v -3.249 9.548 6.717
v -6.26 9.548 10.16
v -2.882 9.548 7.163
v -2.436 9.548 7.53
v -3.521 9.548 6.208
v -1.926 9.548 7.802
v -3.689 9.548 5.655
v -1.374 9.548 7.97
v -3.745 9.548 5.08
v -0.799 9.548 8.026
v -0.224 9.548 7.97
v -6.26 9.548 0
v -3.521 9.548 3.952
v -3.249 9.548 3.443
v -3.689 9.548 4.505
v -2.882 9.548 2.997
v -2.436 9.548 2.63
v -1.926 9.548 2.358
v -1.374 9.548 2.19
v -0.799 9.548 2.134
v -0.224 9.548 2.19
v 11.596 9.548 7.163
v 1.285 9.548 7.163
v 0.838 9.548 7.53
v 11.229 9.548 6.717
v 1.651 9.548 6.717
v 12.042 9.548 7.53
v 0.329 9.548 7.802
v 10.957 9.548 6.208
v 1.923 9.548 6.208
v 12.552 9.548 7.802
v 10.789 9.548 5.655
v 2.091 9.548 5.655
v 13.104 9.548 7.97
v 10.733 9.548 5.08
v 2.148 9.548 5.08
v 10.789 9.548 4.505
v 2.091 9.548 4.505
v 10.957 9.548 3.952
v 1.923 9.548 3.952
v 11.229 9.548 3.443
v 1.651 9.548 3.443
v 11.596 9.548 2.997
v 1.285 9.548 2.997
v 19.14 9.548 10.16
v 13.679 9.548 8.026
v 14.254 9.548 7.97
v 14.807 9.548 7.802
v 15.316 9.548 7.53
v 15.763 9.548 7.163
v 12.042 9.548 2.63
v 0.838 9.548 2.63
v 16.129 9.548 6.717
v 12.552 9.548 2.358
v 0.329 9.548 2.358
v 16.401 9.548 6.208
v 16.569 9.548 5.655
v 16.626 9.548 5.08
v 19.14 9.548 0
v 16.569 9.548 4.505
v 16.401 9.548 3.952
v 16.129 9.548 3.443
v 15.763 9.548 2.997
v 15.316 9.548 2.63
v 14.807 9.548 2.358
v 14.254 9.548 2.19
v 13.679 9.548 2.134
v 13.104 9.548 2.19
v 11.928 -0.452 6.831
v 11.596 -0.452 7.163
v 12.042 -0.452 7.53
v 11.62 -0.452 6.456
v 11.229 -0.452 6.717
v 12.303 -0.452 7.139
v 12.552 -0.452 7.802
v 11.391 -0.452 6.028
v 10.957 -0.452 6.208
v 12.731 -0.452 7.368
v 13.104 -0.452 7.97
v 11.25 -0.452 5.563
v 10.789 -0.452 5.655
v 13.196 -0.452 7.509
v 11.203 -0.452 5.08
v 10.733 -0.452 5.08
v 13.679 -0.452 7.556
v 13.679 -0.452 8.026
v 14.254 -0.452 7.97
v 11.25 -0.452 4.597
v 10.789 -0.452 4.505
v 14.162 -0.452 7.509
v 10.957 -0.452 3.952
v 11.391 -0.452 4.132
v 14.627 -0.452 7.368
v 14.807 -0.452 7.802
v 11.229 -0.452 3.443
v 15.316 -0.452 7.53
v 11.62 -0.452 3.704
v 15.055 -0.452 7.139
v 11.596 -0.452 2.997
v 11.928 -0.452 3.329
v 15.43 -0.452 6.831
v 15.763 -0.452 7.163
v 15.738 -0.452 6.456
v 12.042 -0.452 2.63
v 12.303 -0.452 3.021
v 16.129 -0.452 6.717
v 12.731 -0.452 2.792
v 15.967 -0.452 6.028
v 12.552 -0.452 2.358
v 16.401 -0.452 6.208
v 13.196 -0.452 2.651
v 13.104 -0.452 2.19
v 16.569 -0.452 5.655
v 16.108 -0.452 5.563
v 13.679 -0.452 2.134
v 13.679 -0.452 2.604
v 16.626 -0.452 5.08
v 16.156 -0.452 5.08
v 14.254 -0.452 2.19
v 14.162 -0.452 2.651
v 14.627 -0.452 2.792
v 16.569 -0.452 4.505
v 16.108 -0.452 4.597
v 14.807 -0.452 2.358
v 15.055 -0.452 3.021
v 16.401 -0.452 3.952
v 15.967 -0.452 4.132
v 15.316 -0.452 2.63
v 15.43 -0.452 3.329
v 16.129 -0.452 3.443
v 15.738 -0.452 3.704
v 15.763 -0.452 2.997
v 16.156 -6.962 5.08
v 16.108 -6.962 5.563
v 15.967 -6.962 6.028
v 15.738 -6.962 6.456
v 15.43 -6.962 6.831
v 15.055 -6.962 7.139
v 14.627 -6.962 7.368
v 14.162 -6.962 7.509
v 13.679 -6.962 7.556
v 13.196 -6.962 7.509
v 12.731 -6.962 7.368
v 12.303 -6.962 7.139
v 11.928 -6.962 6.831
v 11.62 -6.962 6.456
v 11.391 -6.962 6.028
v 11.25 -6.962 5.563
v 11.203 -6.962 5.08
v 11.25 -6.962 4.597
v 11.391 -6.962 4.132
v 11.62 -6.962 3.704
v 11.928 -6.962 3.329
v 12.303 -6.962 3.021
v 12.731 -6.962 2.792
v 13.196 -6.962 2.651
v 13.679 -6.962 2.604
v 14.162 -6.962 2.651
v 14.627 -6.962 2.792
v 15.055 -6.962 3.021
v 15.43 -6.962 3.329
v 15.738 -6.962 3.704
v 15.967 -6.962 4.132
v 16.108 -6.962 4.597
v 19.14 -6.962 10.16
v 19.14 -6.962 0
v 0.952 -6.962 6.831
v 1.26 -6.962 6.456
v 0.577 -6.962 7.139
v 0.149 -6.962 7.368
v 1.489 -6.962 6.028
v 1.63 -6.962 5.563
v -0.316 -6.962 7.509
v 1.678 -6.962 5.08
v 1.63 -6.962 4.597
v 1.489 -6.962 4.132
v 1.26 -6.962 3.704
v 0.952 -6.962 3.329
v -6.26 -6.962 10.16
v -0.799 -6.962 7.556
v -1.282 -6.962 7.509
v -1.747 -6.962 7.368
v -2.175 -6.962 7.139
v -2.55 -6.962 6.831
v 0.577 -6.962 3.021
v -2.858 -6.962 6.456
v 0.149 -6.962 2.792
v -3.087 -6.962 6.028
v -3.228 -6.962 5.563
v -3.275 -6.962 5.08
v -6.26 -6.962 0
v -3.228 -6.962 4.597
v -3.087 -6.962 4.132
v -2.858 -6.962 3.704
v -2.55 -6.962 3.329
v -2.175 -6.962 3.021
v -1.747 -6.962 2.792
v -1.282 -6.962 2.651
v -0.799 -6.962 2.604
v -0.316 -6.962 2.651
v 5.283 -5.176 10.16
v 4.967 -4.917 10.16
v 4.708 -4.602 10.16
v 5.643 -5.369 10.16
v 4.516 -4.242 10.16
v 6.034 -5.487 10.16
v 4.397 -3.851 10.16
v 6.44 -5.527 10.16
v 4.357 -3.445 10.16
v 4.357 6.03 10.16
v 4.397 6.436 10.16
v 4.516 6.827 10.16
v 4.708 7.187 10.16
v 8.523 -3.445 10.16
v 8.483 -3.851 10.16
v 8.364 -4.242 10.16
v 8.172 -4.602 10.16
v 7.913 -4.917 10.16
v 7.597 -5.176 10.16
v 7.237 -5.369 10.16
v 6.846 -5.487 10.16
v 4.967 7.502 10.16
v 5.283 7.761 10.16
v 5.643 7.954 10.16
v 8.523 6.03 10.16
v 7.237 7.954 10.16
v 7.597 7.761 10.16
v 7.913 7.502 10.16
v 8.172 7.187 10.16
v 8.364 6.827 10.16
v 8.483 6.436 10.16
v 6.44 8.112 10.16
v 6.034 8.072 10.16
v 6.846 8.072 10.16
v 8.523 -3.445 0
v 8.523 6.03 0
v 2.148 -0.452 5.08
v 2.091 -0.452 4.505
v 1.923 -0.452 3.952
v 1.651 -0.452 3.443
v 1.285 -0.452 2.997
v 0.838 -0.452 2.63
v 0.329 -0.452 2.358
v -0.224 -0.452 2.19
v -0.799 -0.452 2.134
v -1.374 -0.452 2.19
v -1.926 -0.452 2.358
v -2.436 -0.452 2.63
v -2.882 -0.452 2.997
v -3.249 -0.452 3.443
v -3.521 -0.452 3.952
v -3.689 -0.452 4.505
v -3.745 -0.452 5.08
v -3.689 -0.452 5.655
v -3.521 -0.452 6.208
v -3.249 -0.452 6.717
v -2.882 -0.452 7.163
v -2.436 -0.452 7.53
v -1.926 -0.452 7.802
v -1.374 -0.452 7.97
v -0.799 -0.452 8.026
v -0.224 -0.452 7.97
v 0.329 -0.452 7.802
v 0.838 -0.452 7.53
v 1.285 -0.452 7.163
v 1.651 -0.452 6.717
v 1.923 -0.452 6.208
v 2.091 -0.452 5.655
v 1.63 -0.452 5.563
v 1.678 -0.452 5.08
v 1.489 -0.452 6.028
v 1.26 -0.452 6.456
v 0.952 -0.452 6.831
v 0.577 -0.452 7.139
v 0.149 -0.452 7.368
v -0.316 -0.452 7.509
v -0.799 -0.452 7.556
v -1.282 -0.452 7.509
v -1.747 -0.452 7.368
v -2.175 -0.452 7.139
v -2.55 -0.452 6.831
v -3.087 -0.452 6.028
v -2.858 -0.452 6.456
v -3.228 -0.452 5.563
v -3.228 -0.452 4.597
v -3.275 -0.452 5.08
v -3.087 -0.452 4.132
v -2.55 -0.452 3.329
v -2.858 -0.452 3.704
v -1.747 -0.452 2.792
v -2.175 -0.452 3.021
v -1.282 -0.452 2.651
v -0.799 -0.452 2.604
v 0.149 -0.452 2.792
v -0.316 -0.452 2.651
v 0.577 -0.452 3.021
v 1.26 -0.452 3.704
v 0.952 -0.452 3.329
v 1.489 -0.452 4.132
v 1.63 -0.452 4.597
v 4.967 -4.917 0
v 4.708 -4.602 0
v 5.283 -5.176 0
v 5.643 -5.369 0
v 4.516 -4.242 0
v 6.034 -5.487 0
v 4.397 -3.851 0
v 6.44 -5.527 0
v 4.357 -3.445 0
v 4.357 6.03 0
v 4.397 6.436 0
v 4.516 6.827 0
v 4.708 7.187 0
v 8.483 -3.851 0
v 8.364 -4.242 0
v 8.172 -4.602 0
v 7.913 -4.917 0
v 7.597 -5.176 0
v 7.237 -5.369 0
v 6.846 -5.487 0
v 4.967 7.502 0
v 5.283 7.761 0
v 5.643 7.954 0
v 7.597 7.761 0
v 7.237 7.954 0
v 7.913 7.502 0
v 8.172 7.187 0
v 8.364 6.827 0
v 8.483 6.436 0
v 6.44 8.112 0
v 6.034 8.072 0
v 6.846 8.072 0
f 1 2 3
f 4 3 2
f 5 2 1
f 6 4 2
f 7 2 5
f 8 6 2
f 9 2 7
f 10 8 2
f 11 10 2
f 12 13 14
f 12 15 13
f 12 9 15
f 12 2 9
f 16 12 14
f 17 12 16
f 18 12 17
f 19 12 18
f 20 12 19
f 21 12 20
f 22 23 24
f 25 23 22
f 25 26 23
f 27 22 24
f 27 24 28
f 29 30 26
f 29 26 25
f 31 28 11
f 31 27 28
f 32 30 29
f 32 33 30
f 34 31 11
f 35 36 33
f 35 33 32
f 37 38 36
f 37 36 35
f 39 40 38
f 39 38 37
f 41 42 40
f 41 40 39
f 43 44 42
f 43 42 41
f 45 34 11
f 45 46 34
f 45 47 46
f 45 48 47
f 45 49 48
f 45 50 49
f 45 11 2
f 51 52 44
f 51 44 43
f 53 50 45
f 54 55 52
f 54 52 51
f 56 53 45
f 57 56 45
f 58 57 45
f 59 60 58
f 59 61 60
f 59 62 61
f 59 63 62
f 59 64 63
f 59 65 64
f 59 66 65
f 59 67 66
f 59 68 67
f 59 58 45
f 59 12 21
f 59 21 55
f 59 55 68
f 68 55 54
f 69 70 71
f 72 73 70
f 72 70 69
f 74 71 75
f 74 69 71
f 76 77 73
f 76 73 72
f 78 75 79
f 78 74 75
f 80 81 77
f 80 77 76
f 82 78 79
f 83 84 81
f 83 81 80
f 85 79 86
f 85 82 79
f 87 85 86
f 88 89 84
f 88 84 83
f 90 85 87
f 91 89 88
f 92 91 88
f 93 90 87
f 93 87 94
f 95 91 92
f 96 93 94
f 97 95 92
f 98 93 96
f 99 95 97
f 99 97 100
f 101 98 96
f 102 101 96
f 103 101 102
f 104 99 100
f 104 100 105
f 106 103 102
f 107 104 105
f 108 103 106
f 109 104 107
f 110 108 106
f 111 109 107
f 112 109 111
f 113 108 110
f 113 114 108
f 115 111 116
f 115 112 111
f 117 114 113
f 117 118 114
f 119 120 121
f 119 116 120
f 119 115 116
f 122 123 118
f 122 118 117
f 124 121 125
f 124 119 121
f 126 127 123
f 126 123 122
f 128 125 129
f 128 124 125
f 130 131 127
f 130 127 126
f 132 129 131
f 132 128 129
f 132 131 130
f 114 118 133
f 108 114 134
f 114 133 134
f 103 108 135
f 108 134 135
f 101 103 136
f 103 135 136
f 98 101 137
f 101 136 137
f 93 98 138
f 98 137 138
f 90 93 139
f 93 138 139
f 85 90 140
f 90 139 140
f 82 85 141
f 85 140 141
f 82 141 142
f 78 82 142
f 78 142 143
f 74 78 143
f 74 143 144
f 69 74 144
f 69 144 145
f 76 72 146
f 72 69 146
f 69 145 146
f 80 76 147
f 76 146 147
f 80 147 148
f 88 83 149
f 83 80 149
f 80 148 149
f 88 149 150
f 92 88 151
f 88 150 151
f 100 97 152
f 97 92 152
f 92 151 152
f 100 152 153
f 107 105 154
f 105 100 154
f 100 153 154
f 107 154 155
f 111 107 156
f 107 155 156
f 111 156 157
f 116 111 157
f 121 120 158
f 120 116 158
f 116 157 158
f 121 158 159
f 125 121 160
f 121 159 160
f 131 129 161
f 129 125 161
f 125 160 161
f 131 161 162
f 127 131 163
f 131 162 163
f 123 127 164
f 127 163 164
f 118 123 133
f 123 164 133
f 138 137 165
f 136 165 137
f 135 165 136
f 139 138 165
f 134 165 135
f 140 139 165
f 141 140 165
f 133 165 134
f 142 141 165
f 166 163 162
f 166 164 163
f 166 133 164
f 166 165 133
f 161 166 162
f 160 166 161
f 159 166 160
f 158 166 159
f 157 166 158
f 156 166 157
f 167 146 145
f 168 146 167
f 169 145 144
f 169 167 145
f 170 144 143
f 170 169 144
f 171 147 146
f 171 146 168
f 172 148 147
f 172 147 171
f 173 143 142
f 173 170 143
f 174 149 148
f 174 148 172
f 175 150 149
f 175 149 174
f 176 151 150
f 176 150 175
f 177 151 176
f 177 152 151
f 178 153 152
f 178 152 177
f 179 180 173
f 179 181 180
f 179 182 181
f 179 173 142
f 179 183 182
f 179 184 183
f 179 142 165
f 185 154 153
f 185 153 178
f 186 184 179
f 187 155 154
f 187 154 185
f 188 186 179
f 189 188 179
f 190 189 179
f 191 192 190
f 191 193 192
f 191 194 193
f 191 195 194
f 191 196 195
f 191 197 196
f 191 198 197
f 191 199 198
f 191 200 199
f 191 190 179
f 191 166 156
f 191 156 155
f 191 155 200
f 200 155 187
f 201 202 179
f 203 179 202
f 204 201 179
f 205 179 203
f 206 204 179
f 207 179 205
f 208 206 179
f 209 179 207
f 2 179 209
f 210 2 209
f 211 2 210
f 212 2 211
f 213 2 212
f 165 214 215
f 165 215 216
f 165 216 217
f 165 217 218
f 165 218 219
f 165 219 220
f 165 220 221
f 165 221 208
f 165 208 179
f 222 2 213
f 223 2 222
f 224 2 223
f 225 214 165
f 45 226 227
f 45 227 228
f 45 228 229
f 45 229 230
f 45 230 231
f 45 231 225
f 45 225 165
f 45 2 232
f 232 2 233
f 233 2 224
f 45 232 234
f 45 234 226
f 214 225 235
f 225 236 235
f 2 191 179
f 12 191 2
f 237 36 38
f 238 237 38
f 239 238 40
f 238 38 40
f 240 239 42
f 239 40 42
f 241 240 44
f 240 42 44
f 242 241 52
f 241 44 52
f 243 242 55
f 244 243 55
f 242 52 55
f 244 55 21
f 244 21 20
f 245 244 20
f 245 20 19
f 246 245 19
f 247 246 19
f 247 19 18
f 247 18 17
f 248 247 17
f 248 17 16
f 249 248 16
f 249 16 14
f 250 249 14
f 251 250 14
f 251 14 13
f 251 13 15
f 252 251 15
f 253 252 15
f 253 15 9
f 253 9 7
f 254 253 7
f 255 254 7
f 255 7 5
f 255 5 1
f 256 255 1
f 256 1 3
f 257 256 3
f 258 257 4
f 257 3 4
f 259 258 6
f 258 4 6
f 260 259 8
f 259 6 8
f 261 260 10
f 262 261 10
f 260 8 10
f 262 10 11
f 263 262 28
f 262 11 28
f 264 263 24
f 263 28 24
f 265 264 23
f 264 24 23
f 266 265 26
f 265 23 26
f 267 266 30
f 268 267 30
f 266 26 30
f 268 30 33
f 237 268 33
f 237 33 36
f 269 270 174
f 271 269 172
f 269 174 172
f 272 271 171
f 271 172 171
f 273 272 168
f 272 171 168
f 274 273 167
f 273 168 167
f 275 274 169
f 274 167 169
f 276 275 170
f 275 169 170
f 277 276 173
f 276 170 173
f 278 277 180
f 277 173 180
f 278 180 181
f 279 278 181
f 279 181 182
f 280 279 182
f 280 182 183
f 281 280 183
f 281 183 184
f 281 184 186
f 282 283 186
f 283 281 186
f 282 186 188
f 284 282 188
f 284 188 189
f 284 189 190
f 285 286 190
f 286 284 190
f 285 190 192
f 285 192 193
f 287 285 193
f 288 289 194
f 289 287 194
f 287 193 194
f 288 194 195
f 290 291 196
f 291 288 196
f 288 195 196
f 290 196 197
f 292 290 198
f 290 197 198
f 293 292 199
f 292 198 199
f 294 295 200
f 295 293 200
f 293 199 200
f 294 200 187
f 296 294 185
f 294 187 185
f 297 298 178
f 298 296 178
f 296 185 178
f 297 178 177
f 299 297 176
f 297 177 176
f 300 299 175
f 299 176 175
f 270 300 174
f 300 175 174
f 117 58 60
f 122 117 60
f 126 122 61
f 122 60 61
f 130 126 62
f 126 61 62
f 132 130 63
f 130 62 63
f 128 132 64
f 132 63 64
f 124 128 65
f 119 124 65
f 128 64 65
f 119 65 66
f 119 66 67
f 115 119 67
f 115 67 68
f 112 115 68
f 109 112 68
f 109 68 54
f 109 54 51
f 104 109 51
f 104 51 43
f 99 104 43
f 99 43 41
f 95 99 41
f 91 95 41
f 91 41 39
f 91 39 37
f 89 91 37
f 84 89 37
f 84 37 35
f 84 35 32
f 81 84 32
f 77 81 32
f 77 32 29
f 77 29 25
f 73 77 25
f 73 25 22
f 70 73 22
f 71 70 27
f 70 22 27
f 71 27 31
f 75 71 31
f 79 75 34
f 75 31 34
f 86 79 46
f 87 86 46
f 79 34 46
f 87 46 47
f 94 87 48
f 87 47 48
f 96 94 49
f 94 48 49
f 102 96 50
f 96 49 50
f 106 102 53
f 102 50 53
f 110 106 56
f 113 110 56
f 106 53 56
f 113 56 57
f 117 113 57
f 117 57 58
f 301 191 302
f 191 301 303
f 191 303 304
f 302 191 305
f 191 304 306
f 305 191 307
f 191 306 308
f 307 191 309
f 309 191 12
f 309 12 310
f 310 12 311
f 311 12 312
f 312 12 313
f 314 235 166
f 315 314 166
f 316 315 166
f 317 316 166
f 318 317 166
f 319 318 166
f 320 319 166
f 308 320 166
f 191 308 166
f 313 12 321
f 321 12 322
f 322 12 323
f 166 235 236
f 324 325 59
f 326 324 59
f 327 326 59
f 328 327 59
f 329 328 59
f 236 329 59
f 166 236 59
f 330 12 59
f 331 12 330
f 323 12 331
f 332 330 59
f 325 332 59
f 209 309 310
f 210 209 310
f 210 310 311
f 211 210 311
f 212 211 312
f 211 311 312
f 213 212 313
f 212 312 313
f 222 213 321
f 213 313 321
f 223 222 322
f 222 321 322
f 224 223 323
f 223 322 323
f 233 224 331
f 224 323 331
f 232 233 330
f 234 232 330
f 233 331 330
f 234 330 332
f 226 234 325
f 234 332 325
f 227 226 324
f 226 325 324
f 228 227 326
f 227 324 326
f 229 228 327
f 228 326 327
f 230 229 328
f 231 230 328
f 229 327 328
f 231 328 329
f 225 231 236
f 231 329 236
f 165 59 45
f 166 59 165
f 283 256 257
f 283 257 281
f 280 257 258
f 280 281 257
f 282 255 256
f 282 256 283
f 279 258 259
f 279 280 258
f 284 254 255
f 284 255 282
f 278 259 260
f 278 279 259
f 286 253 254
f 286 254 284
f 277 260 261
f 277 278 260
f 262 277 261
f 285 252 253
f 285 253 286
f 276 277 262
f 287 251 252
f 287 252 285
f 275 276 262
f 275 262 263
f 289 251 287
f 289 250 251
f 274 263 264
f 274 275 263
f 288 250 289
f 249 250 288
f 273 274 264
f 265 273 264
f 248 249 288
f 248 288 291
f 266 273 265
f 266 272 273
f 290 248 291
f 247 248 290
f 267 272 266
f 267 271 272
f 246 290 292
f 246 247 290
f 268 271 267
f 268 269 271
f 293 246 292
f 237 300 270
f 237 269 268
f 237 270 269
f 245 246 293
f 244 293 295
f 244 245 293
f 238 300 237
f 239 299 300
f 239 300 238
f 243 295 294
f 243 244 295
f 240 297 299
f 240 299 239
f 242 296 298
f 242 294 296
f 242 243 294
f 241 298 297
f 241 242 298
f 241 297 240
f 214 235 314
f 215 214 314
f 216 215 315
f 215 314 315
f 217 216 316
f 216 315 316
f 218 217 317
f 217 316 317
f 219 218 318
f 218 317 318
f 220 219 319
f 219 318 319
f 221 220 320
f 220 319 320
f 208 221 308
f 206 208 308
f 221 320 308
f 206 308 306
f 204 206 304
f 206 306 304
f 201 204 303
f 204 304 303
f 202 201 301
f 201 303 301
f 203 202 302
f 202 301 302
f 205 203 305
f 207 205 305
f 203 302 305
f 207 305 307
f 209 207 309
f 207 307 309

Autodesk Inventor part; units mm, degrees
ref_plane "YZ Plane" through (0, 0, 0) normal (1, 0, 0) x (0, 1, 0)
ref_plane "XZ Plane" through (0, 0, 0) normal (0, 1, 0) x (-1, 0, 0)
ref_plane "XY Plane" through (0, 0, 0) normal (0, 0, 1) x (1, 0, 0)
sketch "Sketch1" plane through (0, 0, 0) normal (0, 0, 1) x (1, 0, 0)
  line L0 (-6.2599, 9.5475) -> (19.1401, 9.5475)
  line L1 (19.1401, 9.5475) -> (19.1401, -6.9625)
  line L2 (19.1401, -6.9625) -> (-6.2599, -6.9625)
  line L3 (-6.2599, -6.9625) -> (-6.2599, 9.5475)
  point P0 (0, 0)
  dimension "d0" = 25.4
  dimension "d1" = 16.51
extrude "Plate1" add sketch "Sketch1" along normal blind 10.16
sketch "Sketch4" plane through (-6.2599, -6.9625, 0) normal (0, -1, 0) x (1, 0, 0)
  circle A0 centre (5.461, 5.08) radius 2.4765
  circle A1 centre (19.939, 5.08) radius 2.4765
  line L0 (25.4, 0) -> (25.4, 10.16) projected
  line L1 (0, 0) -> (0, 10.16) projected
  line L2 (25.4, 10.16) -> (0, 10.16) projected
  circle A2 centre (5.461, 5.08) radius 2.4765
  circle A3 centre (19.939, 5.08) radius 2.4765
  dimension "d30" = 4.953
  dimension "d37" = 5.461
  dimension "d38" = 5.461
extrude "Extrusion1" cut sketch "Sketch4" against normal blind 14
sketch "Sketch5" plane through (-6.2599, 9.5475, 0) normal (0, 1, 0) x (1, 0, 0)
  circle A0 centre (5.461, -5.08) radius 2.4765 projected
  circle A1 centre (5.461, -5.08) radius 2.9464
  circle A2 centre (19.939, -5.08) radius 2.4765 projected
  circle A3 centre (19.939, -5.08) radius 2.9464
  line L0 (25.4, 0) -> (25.4, -10.16) projected
  line L1 (0, 0) -> (0, -10.16) projected
  point P0 (6.2599, 0)
extrude "Extrusion2" cut sketch "Sketch5" against normal blind 10
sketch "Sketch6" plane through (0, 0, 0) normal (0, 0, -1) x (-1, 0, 0)
  line L0 (-19.1401, 9.5475) -> (-19.1401, -6.9625) projected
  line L1 (6.2599, 9.5475) -> (-19.1401, 9.5475)
  line L2 (6.2599, -6.9625) -> (6.2599, 9.5475) projected
  line L3 (6.2599, 1.2925) -> (-19.1401, 1.2925) construction
  line L4 (-6.4401, 6.0296) -> (-6.4401, -3.4446) construction
  line L5 (-19.1401, -6.9625) -> (6.2599, -6.9625) projected
  line L6 (-8.5229, 6.0296) -> (-8.5229, -3.4446)
  line L7 (-4.3573, -3.4446) -> (-4.3573, 6.0296)
  arc A0 (-4.3573, 6.0296) -> (-8.5229, 6.0296) centre (-6.4401, 6.0296) ccw
  arc A1 (-8.5229, -3.4446) -> (-4.3573, -3.4446) centre (-6.4401, -3.4446) ccw
  point P0 (-6.4401, 1.2925)
  dimension "d26" = 13.6398
  dimension "d27" = 2.0828
extrude "Extrusion3" cut sketch "Sketch6" against normal through all contours A0 L7 A1 L6
sketch "Sketch7" plane through (-6.2599, 9.5475, 0) normal (0, 1, 0) x (1, 0, 0)
  circle A0 centre (5.461, -5.08) radius 2.9464 projected
  circle A1 centre (5.461, -5.08) radius 2.4765
  circle A2 centre (19.939, -5.08) radius 2.4765 projected
  circle A3 centre (19.939, -5.08) radius 2.4765
  point P0 (6.2599, 0)
extrude "Extrusion4" cut sketch "Sketch7" against normal up to next contours A1 | A2
sketch "Sketch8" plane through (0, 0, 0) normal (0, 0, -1) x (-1, 0, 0)
  arc A0 (-8.5229, -3.4446) -> (-4.3573, -3.4446) centre (-6.4401, -3.4446) ccw projected
  line L0 (-8.5229, -3.4446) -> (-8.5229, 6.0296) projected
  line L1 (-6.4401, 1.2925) -> (-3.3921, 1.2925) construction
  line L2 (-6.4401, 1.2925) -> (-9.4881, 1.2925) construction
  line L3 (-3.3921, 1.2925) -> (-3.3921, 9.5475) construction
  line L4 (6.2599, 9.5475) -> (-19.1401, 9.5475) projected
  point P0 (0, 0)
  dimension "d41" = 3.048
  dimension "d42" = 3.048
equation "\"BendRadius\" = Thickness"
equation "\"BendReliefWidth\" = Thickness"
equation "\"BendReliefDepth\" = 0.5 * Thickness"
equation "\"CornerReliefSize\" = 4 * Thickness"
equation "\"MinimumRemnant\" = 2 * Thickness"
equation "\"TransitionRadius\" = BendRadius"
equation "\"JacobiRadiusSize\" = Thickness"
equation "\"GapSize\" = Thickness"
equation "\"d2\" = BendRadius"
equation "\"Thickness\" = 10.16"
properties part number "Hew Sensor Mount 2017"
